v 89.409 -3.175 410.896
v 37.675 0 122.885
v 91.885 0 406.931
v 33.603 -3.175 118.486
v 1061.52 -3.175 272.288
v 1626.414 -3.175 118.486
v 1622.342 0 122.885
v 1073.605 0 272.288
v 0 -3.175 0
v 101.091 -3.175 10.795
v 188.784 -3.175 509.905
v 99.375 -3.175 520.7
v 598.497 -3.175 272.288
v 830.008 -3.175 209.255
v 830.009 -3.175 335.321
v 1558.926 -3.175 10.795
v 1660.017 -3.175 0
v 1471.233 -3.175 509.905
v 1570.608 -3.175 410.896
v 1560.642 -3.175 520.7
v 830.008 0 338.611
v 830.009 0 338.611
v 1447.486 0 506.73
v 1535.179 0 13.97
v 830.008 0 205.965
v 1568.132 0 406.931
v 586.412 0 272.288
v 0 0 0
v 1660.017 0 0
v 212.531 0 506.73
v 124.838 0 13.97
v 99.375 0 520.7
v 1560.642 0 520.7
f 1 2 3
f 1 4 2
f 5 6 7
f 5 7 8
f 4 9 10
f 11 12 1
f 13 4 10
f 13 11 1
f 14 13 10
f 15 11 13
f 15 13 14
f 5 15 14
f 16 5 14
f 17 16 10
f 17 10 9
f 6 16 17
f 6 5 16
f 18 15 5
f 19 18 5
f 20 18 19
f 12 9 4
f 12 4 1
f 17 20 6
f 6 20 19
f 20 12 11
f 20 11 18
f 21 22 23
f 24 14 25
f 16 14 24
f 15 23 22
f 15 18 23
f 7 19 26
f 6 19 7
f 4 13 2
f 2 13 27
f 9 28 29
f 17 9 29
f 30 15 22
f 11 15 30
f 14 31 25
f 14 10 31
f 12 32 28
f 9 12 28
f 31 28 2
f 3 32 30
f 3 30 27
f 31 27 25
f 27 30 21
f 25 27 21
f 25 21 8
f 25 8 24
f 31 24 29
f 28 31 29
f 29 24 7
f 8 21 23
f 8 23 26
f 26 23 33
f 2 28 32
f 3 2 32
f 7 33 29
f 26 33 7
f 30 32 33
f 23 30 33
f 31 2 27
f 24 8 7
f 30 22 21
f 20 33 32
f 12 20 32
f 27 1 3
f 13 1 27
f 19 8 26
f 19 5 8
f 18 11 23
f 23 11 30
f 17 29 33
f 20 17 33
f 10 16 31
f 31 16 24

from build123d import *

# Parameters (mm, degrees)
F1_DEPTH = 3.175
F2_SIZE  = 3.17499


# Not quite as in the source:
# - a fillet or chamfer is up to 0.001 mm smaller than in the source, because OpenCascade refuses the exact size


with BuildPart() as f1:
    # F0 (on Front) → F1 (new body)
    with BuildSketch(Plane.XZ):
        Polygon((99.3750451773, 520.7), (0, 0), (1660.017, 0), (1560.6419548227, 520.7), align=None)
        Polygon((1535.1786987879, 13.97), (124.8383012121, 13.97), (830.0085, 205.9645134825), align=None, mode=Mode.SUBTRACT)
        Polygon((37.6746165108, 122.8850133893), (91.8845400349, 406.9312458074), (586.4115107328, 272.2879138766), align=None, mode=Mode.SUBTRACT)
        Polygon((1568.1324599651, 406.9312458074), (1622.3423834892, 122.8850133893), (1073.6054892672, 272.2879138766), align=None, mode=Mode.SUBTRACT)
        Polygon((830.0085, 338.6113142706), (212.5310268921, 506.73), (1447.4859731079, 506.73), align=None, mode=Mode.SUBTRACT)
    extrude(amount=F1_DEPTH)

    # F2 (size 3.175 in the source; OpenCascade refuses exactly that, so slightly less here)
    f2_edges = [f1.edges().sort_by_distance(p)[0] for p in [
        (64.779578, -3.175, 264.90813),
        (312.043064, -3.175, 197.586464),
        (339.148025, -3.175, 339.60958),
        (521.269763, -3.175, 422.670657),
        (830.0085, -3.175, 506.73),
        (1138.747237, -3.175, 422.670657),
        (1320.868975, -3.175, 339.60958),
        (1347.973936, -3.175, 197.586464),
        (1595.237422, -3.175, 264.90813),
        (830.0085, -3.175, 13.97),
        (1182.593599, -3.175, 109.967257),
        (477.423401, -3.175, 109.967257),
    ]]
    chamfer(f2_edges, length=F2_SIZE)


solid = f1.part
